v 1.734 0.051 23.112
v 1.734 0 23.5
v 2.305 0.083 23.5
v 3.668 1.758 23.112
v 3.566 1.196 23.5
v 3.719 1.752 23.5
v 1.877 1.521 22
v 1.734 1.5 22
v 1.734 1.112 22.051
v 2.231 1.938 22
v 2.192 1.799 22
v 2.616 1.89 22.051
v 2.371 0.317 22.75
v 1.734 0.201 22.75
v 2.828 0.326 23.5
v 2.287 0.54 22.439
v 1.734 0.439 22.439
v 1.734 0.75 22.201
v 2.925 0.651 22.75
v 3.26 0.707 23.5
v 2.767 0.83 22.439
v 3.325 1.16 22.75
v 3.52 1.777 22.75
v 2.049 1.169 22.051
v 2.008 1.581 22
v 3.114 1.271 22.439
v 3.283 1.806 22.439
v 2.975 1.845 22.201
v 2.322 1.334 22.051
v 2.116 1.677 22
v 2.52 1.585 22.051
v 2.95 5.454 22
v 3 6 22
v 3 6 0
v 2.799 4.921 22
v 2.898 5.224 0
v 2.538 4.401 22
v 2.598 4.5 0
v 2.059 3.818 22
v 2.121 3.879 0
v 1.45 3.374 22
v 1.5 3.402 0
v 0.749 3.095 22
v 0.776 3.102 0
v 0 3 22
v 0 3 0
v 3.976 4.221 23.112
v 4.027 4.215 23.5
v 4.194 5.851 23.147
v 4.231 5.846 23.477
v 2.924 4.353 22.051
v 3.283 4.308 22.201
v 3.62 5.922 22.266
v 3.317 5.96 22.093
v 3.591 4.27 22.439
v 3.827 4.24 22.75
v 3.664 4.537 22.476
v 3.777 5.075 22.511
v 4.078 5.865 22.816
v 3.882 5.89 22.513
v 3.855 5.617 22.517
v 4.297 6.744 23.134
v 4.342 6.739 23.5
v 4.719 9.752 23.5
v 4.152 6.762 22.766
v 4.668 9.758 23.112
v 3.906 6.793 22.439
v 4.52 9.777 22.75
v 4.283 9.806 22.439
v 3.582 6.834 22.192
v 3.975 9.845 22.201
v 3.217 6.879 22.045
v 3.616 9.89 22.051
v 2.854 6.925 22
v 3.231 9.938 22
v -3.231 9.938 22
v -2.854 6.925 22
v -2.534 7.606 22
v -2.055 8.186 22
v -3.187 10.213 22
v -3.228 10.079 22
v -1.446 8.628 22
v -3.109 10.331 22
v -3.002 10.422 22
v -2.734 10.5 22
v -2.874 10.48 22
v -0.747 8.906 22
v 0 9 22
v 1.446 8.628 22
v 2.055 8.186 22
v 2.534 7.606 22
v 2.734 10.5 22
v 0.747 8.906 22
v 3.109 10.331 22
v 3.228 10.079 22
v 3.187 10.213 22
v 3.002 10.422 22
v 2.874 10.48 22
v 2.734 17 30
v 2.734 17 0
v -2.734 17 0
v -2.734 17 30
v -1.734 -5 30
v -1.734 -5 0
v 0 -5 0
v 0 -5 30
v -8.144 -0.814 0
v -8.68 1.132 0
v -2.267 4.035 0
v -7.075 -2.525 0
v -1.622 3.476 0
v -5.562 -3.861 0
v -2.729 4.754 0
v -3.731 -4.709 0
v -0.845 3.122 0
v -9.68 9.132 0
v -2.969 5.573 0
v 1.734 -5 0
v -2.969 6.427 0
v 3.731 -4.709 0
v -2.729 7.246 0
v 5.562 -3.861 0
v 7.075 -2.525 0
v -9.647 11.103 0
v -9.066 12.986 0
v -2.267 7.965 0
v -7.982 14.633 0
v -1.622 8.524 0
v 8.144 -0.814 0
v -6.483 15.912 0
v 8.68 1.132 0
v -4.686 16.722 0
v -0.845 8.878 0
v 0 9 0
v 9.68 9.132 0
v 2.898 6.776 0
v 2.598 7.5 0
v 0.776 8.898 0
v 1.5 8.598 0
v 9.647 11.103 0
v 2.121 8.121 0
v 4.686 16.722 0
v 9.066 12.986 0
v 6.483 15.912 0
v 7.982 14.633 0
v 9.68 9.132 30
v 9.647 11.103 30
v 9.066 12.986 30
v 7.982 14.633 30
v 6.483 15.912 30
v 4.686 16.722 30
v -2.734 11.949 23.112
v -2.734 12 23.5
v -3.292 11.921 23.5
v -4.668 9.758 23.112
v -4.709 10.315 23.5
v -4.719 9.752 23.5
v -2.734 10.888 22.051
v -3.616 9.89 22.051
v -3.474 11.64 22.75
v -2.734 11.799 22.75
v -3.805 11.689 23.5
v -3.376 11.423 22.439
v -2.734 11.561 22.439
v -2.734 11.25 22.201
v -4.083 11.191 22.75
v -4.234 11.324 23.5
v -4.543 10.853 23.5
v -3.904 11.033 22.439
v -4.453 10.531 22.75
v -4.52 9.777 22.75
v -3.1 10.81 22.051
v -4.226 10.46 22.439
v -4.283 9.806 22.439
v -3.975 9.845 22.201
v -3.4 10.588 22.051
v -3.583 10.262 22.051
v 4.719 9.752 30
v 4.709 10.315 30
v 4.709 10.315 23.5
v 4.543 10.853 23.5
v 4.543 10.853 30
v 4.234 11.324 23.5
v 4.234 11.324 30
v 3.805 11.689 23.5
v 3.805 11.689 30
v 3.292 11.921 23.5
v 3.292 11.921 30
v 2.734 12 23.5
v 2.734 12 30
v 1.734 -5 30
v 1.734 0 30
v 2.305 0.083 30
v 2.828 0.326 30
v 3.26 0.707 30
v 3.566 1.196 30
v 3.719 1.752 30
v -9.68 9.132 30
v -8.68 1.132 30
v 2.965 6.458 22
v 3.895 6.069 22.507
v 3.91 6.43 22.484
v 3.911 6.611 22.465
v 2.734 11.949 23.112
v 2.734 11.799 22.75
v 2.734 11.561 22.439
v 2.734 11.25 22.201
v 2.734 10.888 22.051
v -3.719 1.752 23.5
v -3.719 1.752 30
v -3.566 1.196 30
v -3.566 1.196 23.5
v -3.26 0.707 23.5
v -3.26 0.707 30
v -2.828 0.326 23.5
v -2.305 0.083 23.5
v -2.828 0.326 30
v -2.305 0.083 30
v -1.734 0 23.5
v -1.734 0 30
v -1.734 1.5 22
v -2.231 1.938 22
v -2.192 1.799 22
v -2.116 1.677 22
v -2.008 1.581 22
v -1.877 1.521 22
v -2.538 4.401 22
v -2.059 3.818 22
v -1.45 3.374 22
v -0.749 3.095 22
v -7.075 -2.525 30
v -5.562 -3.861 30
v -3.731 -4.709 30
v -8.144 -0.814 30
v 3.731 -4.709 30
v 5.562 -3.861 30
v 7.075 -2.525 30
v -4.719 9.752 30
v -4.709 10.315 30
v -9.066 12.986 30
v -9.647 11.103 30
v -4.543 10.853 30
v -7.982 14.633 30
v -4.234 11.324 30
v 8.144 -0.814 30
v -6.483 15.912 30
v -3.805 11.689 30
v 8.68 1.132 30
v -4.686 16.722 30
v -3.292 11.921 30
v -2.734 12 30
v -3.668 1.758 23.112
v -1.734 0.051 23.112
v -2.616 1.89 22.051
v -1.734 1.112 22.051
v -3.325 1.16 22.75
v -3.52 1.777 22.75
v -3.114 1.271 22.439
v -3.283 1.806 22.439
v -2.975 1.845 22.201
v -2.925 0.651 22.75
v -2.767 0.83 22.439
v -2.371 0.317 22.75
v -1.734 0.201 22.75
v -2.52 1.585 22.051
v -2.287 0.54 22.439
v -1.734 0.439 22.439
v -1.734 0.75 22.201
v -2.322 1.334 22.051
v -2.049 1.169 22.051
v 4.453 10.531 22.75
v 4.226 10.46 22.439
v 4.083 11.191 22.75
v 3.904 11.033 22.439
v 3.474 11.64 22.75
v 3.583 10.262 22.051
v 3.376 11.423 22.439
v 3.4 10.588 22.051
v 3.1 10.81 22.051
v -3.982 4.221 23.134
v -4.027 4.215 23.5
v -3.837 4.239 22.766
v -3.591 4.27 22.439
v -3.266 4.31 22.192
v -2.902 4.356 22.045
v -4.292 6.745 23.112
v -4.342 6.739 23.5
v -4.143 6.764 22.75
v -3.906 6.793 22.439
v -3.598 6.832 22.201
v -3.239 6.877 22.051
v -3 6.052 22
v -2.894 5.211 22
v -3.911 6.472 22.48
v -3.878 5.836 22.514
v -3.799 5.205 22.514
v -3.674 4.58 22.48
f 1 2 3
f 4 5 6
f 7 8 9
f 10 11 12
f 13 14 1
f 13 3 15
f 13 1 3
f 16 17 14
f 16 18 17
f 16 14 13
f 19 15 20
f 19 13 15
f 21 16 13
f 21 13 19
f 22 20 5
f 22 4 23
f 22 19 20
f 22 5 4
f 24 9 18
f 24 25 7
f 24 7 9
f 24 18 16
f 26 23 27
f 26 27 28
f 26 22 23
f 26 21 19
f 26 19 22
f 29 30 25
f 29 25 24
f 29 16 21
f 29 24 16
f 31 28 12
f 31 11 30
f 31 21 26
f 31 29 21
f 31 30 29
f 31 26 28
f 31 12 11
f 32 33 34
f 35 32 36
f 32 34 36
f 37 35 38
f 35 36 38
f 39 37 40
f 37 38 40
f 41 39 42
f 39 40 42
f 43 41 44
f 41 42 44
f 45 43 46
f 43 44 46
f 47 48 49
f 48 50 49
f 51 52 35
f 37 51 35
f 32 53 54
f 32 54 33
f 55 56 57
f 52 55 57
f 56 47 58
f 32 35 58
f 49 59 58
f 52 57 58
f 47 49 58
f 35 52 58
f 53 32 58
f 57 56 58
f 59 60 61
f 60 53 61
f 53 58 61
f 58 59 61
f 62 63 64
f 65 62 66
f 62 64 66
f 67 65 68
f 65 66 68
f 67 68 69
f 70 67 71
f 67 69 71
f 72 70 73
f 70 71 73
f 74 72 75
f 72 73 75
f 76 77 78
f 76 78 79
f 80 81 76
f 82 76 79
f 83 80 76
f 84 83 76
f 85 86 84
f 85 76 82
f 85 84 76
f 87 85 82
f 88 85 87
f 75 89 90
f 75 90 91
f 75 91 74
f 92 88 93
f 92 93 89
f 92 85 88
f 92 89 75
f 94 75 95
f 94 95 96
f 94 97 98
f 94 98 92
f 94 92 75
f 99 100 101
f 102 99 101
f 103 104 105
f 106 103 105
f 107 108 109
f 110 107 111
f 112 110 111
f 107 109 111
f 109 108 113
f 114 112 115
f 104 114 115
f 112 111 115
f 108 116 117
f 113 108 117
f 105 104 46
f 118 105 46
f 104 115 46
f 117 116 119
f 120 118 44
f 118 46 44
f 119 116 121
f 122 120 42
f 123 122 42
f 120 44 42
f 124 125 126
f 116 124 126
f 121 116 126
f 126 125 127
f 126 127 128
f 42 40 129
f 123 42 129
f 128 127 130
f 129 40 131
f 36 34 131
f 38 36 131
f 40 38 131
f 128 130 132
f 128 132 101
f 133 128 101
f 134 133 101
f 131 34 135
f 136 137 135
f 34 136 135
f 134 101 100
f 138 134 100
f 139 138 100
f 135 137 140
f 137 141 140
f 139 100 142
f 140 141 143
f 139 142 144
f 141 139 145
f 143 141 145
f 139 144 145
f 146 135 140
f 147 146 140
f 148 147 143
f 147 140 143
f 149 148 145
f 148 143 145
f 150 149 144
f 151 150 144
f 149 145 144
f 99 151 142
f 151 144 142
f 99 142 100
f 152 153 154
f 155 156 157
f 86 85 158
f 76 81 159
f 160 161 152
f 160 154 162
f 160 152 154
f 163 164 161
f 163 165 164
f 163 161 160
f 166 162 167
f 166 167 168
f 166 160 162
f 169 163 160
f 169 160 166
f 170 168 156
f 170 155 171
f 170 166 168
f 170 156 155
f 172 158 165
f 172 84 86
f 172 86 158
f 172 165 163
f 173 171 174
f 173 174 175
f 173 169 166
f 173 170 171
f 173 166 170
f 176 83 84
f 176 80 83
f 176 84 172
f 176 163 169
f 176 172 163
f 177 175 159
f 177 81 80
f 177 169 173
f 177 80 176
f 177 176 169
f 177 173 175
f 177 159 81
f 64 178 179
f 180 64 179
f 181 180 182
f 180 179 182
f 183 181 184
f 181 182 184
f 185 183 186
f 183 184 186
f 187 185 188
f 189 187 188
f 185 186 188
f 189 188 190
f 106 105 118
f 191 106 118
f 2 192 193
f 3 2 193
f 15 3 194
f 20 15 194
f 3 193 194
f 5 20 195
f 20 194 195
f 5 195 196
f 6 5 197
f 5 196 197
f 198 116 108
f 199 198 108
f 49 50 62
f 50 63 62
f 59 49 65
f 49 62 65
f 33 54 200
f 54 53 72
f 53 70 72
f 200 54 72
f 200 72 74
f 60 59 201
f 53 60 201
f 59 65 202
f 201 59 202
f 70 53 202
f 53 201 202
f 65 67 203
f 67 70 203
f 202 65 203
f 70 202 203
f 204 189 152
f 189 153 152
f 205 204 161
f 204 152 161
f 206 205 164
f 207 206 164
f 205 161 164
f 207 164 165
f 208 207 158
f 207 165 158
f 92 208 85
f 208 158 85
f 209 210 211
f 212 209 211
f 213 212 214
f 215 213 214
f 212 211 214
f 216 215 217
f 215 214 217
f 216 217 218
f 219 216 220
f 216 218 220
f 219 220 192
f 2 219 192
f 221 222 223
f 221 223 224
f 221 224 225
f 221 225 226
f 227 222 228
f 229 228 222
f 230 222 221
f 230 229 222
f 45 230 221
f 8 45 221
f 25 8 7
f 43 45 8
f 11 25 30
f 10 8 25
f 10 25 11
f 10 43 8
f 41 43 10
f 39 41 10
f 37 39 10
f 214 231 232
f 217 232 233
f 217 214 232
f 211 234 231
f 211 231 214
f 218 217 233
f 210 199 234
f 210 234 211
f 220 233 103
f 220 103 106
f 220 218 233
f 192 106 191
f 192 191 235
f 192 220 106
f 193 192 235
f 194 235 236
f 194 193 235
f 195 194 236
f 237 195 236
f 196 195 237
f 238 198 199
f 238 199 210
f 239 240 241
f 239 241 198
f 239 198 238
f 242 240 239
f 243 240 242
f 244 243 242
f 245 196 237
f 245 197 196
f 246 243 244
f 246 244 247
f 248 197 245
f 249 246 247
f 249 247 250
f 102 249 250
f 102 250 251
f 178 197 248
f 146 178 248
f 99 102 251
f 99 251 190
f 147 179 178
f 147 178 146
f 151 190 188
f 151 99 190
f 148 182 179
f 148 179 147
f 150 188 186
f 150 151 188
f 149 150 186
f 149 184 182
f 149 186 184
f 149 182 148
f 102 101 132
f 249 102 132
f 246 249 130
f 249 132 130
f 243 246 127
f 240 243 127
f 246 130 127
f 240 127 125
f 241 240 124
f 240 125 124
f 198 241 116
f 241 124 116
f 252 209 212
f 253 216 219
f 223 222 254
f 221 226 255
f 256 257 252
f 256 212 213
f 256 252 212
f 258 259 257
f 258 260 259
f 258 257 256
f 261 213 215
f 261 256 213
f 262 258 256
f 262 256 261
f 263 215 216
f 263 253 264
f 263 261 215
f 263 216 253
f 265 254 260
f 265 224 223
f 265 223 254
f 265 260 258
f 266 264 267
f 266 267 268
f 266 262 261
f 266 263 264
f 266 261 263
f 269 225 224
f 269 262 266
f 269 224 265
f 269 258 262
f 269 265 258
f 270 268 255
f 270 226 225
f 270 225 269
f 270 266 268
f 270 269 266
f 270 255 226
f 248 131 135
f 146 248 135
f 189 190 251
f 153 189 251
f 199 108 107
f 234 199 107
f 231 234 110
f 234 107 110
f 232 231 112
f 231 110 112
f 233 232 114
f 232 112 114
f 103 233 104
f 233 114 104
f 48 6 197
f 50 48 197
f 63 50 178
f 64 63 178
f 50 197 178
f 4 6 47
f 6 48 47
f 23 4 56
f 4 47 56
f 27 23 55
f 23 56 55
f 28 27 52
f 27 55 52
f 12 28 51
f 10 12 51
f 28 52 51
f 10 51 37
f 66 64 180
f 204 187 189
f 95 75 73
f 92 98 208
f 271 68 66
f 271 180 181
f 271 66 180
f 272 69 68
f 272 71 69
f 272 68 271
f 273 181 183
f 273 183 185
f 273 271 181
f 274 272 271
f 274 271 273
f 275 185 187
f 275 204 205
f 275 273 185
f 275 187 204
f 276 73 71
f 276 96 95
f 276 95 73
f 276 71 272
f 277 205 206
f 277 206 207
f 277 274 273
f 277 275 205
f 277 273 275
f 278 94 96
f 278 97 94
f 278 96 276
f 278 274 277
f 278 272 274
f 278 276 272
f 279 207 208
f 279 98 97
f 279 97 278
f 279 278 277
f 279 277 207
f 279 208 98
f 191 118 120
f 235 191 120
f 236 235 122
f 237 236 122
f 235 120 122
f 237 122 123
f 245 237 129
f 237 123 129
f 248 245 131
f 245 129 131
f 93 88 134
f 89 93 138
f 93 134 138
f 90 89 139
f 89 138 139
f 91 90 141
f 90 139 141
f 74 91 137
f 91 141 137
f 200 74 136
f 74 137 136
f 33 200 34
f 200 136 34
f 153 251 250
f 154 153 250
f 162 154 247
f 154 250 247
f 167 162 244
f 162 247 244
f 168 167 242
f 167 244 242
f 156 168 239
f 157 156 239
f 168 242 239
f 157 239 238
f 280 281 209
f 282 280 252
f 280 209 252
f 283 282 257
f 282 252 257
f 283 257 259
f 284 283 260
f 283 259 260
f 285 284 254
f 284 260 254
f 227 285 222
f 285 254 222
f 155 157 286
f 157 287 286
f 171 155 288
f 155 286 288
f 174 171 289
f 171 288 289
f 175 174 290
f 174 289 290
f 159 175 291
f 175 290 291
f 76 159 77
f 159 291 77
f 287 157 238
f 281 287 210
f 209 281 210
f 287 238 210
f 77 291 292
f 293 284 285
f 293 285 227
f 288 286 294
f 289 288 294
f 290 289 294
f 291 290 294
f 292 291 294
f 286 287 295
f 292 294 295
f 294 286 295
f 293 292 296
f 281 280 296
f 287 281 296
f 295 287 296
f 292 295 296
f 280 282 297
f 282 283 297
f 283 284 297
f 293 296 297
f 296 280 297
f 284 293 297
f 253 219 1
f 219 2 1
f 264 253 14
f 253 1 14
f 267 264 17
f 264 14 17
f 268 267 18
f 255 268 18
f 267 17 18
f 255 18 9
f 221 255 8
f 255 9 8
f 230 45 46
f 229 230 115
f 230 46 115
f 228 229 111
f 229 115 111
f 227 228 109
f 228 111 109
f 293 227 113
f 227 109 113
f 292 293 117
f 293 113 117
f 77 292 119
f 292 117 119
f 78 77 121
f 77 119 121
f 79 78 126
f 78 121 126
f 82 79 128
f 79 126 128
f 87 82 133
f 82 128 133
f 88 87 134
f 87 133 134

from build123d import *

# Parameters (mm, degrees)
F3_DEPTH = 30
F4_DEPTH = 8
F5_R     = 1.5


# Not quite as in the source:
# - ends of sketch curves that miss each other by under 0.0002 mm in the source are joined


with BuildPart() as f3:
    # F0 (on Top) → F3 (new body)
    with BuildSketch(Plane.XY):
        with BuildLine():
            Line((2.7344355629, 17), (0, 17))
            Line((0, 17), (-2.7344355629, 17))
            ThreePointArc((-2.7344355629, 17), (-7.9821831045, 14.6326182171), (-9.6803811114, 9.1317568064))
            Line((-9.6803811114, 9.1317568064), (-8.6803809552, 1.131756826))
            ThreePointArc((-8.6803809552, 1.131756826), (-6.3670534302, -3.2477471454), (-1.7344355629, -4.9999998862))
            Line((-1.7344355629, -4.9999998862), (0, -4.9999998882))
            Line((0, -4.9999998882), (1.7344355629, -5))
            ThreePointArc((1.7344355629, -5), (6.3670535056, -3.2477472307), (8.6803806999, 1.1317568579))
            Line((8.6803806999, 1.1317568579), (9.6803806999, 9.1317568579))
            ThreePointArc((9.6803806999, 9.1317568579), (7.9821826424, 14.6326178092), (2.7344355629, 17))
        make_face()
        with BuildLine():
            Line((1.7344355629, 0), (0, 0))
            Line((0, 0), (-1.7344355629, 0))
            ThreePointArc((-1.7344355629, 0), (-3.0580406894, 0.5006436484), (-3.7189913164, 1.7519305308))
            Line((-3.7189913164, 1.7519305308), (-4.7189913164, 9.7519305308))
            ThreePointArc((-4.7189913164, 9.7519305308), (-4.2337919146, 11.3236051265), (-2.7344355629, 12))
            Line((-2.7344355629, 12), (0, 12))
            Line((0, 12), (2.7344355629, 12))
            ThreePointArc((2.7344355629, 12), (4.2337919146, 11.3236051265), (4.7189913164, 9.7519305308))
            Line((4.7189913164, 9.7519305308), (3.7189913164, 1.7519305308))
            ThreePointArc((3.7189913164, 1.7519305308), (3.0580406894, 0.5006436484), (1.7344355629, 0))
        make_face(mode=Mode.SUBTRACT)
        with BuildLine():
            Line((-1.7344355629, 0), (0, 0))
            Line((0, 0), (0, 3))
            ThreePointArc((0, 3), (-3, 6), (0, 9))
            Line((0, 9), (0, 12))
            Line((0, 12), (-2.7344355629, 12))
            ThreePointArc((-2.7344355629, 12), (-4.2337919146, 11.3236051265), (-4.7189913164, 9.7519305308))
            Line((-4.7189913164, 9.7519305308), (-3.7189913164, 1.7519305308))
            ThreePointArc((-3.7189913164, 1.7519305308), (-3.0580406894, 0.5006436484), (-1.7344355629, 0))
        make_face()
        with BuildLine():
            Line((0, 3), (0, 0))
            Line((0, 0), (1.7344355629, 0))
            ThreePointArc((1.7344355629, 0), (3.0580406894, 0.5006436484), (3.7189913164, 1.7519305308))
            Line((3.7189913164, 1.7519305308), (4.7189913164, 9.7519305308))
            ThreePointArc((4.7189913164, 9.7519305308), (4.2337919146, 11.3236051265), (2.7344355629, 12))
            Line((2.7344355629, 12), (0, 12))
            Line((0, 12), (0, 9))
            ThreePointArc((0, 9), (2.1213203436, 8.1213203436), (3, 6))
            ThreePointArc((3, 6), (2.1213203436, 3.8786796564), (0, 3))
        make_face()
    extrude(amount=F3_DEPTH)

    # F2 (on offset) → F4 (cut)
    with BuildSketch(Plane.XY.offset(30)):
        with BuildLine():
            ThreePointArc((-3.7189913164, 1.7519305308), (-3.0580406894, 0.5006436484), (-1.7344355629, 0))
            Line((-1.7344355629, 0), (0, 0))
            Line((0, 0), (0, 3))
            ThreePointArc((0, 3), (-3, 6), (0, 9))
            Line((0, 9), (0, 12))
            Line((0, 12), (-2.7344355629, 12))
            ThreePointArc((-2.7344355629, 12), (-4.2337919146, 11.3236051265), (-4.7189913164, 9.7519305308))
            Line((-4.7189913164, 9.7519305308), (-3.7189913164, 1.7519305308))
        make_face()
        with BuildLine():
            Line((0, 3), (0, 0))
            Line((0, 0), (1.7344355629, 0))
            ThreePointArc((1.7344355629, 0), (3.0580406894, 0.5006436484), (3.7189913164, 1.7519305308))
            Line((3.7189913164, 1.7519305308), (4.7189913164, 9.7519305308))
            ThreePointArc((4.7189913164, 9.7519305308), (4.2337919146, 11.3236051265), (2.7344355629, 12))
            Line((2.7344355629, 12), (0, 12))
            Line((0, 12), (0, 9))
            ThreePointArc((0, 9), (3, 6), (0, 3))
        make_face()
    extrude(amount=-F4_DEPTH, mode=Mode.SUBTRACT)

    # F5
    f5_edges = [f3.edges().sort_by_distance(p)[0] for p in [
        (-4.233792, 11.323605, 22),
        (-4.218991, 5.751931, 22),
    ]]
    fillet(f5_edges, radius=F5_R)


solid = f3.part
